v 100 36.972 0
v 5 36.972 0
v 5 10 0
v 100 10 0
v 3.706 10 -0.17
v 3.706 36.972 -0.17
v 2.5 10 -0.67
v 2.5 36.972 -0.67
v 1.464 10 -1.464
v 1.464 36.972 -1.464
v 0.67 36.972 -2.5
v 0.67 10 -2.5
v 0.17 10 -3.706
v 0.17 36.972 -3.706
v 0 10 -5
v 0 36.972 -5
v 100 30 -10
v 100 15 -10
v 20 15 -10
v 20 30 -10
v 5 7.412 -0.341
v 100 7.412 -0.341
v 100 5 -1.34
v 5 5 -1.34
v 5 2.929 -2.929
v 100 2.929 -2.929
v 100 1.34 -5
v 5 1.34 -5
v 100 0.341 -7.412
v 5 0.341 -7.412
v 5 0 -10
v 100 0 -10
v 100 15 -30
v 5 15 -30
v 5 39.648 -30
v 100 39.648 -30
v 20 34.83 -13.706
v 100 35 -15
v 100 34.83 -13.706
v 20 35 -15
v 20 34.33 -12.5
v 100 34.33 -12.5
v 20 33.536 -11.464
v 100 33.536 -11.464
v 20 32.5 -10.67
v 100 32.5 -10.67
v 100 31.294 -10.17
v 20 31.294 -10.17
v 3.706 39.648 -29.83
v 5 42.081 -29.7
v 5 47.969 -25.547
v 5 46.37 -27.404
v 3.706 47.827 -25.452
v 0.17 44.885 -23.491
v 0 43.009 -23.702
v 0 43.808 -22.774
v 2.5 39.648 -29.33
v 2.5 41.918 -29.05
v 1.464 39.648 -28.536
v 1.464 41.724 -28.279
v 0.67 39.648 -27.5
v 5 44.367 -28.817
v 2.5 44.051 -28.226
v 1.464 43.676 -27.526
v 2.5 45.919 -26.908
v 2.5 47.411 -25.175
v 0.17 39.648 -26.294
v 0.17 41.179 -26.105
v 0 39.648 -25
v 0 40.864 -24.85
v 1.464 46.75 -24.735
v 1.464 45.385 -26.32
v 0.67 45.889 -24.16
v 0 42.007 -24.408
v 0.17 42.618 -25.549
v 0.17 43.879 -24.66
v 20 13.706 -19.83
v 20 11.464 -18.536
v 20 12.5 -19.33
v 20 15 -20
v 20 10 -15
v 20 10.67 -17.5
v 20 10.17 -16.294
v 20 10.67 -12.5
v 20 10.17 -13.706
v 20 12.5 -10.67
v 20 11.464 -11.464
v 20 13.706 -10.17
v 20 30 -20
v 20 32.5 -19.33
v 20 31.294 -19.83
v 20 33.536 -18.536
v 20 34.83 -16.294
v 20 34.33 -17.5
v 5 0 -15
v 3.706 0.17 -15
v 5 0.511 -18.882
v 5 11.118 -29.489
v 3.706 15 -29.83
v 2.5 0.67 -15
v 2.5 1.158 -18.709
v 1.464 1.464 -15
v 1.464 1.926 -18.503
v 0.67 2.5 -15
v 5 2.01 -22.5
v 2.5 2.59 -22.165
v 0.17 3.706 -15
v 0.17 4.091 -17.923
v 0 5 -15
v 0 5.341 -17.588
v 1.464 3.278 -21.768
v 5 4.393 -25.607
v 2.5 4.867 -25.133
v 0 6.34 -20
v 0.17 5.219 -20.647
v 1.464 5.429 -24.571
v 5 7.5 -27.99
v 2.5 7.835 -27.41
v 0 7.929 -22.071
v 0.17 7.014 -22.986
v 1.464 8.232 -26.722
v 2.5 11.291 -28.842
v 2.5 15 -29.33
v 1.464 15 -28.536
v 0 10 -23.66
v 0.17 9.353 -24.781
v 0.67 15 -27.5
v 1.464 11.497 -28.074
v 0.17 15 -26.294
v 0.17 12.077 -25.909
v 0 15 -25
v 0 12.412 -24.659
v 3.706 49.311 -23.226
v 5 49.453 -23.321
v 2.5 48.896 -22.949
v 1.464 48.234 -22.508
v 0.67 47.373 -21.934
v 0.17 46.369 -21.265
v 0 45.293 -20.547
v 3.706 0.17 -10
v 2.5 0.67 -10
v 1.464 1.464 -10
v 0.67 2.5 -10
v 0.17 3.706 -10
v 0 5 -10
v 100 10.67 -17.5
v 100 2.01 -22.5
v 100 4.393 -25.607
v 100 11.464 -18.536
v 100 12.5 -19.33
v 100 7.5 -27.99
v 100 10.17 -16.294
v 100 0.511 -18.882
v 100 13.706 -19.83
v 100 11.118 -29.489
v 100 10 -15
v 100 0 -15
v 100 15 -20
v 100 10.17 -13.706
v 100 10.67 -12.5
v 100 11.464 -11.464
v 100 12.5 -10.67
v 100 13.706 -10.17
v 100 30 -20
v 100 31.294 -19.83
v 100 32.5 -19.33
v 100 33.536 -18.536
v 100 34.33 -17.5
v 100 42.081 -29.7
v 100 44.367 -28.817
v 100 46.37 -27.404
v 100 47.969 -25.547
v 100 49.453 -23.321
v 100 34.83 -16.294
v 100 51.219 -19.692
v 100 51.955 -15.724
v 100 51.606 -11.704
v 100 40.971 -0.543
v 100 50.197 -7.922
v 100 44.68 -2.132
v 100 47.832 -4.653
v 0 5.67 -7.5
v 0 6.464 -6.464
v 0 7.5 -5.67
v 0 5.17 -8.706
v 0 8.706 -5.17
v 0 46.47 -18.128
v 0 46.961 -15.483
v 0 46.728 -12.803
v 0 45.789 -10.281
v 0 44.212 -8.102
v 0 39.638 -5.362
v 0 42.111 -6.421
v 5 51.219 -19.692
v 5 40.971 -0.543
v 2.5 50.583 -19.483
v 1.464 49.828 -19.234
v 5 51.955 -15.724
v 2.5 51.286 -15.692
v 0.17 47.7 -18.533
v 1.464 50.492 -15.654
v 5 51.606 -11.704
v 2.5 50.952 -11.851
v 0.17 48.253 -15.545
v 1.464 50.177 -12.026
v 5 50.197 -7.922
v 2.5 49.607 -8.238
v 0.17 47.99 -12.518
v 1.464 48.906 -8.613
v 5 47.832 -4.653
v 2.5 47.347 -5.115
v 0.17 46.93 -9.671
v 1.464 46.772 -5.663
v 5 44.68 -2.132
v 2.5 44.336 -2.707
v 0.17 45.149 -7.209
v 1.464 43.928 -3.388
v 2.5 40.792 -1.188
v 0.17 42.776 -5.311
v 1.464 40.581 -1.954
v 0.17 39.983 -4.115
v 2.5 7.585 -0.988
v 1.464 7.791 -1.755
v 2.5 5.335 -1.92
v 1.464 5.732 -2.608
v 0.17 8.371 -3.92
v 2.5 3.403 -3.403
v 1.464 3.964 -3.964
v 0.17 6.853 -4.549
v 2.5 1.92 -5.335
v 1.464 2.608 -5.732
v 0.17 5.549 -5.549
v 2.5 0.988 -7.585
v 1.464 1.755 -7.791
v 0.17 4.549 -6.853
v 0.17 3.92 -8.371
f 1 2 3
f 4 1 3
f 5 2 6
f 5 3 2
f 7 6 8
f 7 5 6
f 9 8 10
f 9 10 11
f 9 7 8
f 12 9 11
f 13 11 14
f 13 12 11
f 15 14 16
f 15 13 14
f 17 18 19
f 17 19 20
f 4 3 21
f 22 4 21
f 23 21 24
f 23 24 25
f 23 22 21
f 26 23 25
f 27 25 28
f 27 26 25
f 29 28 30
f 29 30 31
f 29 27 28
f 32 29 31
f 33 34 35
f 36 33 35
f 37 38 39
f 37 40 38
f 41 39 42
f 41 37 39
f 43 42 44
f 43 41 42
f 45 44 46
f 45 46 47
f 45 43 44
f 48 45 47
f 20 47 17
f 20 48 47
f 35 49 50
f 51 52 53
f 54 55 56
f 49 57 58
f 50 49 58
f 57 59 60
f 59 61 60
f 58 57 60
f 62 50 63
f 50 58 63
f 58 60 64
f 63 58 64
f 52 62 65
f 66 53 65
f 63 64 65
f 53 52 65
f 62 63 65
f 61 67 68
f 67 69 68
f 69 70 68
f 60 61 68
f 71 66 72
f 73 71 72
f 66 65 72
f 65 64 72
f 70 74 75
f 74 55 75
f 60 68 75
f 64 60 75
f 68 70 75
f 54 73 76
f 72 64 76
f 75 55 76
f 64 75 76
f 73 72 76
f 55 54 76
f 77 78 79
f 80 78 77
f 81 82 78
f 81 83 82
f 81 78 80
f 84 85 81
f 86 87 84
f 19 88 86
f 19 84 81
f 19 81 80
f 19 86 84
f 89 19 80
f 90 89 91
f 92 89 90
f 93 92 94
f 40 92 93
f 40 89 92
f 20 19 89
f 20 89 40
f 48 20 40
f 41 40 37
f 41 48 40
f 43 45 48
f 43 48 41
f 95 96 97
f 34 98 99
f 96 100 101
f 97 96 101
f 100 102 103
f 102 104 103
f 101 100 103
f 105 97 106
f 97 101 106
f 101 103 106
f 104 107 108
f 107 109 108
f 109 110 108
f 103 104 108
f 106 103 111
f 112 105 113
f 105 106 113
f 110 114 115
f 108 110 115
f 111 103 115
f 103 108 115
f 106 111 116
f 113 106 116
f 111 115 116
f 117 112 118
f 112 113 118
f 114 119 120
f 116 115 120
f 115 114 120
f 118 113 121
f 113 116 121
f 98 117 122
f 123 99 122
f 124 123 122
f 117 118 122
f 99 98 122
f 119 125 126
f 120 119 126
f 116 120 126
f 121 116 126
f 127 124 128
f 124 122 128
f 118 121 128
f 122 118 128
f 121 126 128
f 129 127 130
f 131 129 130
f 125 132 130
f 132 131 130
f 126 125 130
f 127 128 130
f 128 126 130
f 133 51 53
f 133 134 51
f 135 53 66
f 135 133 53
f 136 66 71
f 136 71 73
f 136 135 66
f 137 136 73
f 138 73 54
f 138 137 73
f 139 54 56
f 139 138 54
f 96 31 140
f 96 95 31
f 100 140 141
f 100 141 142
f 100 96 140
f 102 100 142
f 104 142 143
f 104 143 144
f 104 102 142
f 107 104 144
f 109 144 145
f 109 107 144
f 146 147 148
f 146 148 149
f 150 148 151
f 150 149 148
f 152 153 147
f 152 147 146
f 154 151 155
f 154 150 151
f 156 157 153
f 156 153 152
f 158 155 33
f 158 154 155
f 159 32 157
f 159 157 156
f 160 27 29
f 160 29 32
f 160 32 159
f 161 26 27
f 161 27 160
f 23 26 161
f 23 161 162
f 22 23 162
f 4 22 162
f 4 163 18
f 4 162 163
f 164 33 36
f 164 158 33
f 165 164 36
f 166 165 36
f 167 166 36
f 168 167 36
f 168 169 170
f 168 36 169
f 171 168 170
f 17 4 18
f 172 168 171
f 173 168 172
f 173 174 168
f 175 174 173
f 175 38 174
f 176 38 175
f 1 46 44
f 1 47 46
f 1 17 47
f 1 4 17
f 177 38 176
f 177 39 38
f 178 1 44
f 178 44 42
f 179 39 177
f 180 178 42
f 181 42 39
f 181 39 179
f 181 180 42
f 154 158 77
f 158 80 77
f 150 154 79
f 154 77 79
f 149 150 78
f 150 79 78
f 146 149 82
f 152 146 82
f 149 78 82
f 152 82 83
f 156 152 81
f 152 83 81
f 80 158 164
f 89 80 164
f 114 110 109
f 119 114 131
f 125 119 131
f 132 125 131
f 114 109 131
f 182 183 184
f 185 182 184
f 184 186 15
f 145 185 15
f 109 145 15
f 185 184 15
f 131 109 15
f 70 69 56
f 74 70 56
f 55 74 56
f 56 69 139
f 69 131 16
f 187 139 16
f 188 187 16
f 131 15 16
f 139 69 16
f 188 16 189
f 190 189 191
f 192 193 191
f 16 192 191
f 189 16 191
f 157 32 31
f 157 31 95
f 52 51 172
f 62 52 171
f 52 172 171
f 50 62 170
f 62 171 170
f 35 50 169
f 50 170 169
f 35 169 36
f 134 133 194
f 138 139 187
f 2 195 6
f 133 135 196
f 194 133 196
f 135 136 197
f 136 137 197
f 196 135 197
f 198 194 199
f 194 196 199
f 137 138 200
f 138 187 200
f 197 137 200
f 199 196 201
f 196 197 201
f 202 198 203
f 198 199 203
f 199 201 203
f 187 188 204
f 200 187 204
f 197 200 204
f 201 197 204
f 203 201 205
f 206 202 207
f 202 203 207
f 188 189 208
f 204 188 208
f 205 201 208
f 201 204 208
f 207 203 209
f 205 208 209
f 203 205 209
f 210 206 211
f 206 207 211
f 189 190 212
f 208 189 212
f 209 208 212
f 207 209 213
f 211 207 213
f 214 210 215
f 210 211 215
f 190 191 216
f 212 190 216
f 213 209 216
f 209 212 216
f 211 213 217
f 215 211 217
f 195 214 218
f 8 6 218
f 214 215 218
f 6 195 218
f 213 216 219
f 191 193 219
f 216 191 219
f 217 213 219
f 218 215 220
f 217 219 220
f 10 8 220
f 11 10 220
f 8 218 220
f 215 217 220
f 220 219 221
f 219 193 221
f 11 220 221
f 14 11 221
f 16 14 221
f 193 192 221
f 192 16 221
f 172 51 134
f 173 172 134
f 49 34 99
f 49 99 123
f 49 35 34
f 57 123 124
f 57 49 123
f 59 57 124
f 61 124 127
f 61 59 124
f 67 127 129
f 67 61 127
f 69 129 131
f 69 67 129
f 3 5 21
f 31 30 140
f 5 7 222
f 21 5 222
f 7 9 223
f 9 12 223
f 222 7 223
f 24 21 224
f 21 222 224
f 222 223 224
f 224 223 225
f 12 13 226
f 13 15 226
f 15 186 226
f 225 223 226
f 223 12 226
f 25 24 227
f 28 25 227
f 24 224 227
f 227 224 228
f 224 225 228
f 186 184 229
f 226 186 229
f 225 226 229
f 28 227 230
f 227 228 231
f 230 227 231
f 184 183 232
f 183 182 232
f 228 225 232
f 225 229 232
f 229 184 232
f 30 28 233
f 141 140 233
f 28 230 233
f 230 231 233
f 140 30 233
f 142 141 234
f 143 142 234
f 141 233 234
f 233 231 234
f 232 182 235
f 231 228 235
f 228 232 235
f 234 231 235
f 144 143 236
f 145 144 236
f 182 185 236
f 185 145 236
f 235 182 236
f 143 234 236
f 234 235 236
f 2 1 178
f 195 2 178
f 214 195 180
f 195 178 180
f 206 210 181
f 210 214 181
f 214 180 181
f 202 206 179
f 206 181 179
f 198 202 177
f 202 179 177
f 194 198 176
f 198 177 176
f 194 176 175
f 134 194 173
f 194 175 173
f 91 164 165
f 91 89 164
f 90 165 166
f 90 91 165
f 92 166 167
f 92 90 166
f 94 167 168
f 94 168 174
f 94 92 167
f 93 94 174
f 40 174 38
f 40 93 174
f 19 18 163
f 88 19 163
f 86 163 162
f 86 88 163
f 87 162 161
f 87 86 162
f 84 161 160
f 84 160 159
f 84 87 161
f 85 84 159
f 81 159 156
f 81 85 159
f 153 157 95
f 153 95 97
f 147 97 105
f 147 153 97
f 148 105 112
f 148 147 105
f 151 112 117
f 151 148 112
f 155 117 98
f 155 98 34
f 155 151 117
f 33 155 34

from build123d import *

# Parameters (mm, degrees)
F1_DEPTH = 100
F2_R     = 15
F3_W     = 25
F3_H     = 10
F4_DEPTH = 80
F5_R     = 4.99999
F6_R     = 10
F7_R     = 5


# Not quite as in the source:
# - a fillet or chamfer is up to 0.001 mm smaller than in the source, because OpenCascade refuses the exact size


with BuildPart() as f1:
    # F0 (on Right) → F1 (new body)
    with BuildSketch(Plane.YZ):
        Polygon((65, 0), (0, 0), (0, -30), (45, -30), align=None)
    extrude(amount=F1_DEPTH)

    # F2
    f2_edges = [f1.edges().sort_by_distance(p)[0] for p in [
        (50, 65, 0),
        (50, 0, -30),
    ]]
    fillet(f2_edges, radius=F2_R)

    # F3 (on face) → F4 (cut)
    with BuildSketch(Plane.YZ.offset(100)):
        with Locations((22.5, -15)):
            Rectangle(F3_W, F3_H)
    extrude(amount=-F4_DEPTH, mode=Mode.SUBTRACT)

    # F5 (radius 5 in the source; OpenCascade refuses exactly that, so slightly less here)
    f5_edges = [f1.edges().sort_by_distance(p)[0] for p in [
        (60, 10, -10),
        (60, 10, -20),
        (60, 35, -10),
        (60, 35, -20),
    ]]
    fillet(f5_edges, radius=F5_R)

    # F6
    f6_edges = [f1.edges().sort_by_distance(p)[0] for p in [
        (50, 0, 0),
        (50, 45, -30),
    ]]
    fillet(f6_edges, radius=F6_R)

    # F7
    f7_edges = [f1.edges().sort_by_distance(p)[0] for p in [
        (0, 23.486122, 0),
    ]]
    fillet(f7_edges, radius=F7_R)


solid = f1.part
